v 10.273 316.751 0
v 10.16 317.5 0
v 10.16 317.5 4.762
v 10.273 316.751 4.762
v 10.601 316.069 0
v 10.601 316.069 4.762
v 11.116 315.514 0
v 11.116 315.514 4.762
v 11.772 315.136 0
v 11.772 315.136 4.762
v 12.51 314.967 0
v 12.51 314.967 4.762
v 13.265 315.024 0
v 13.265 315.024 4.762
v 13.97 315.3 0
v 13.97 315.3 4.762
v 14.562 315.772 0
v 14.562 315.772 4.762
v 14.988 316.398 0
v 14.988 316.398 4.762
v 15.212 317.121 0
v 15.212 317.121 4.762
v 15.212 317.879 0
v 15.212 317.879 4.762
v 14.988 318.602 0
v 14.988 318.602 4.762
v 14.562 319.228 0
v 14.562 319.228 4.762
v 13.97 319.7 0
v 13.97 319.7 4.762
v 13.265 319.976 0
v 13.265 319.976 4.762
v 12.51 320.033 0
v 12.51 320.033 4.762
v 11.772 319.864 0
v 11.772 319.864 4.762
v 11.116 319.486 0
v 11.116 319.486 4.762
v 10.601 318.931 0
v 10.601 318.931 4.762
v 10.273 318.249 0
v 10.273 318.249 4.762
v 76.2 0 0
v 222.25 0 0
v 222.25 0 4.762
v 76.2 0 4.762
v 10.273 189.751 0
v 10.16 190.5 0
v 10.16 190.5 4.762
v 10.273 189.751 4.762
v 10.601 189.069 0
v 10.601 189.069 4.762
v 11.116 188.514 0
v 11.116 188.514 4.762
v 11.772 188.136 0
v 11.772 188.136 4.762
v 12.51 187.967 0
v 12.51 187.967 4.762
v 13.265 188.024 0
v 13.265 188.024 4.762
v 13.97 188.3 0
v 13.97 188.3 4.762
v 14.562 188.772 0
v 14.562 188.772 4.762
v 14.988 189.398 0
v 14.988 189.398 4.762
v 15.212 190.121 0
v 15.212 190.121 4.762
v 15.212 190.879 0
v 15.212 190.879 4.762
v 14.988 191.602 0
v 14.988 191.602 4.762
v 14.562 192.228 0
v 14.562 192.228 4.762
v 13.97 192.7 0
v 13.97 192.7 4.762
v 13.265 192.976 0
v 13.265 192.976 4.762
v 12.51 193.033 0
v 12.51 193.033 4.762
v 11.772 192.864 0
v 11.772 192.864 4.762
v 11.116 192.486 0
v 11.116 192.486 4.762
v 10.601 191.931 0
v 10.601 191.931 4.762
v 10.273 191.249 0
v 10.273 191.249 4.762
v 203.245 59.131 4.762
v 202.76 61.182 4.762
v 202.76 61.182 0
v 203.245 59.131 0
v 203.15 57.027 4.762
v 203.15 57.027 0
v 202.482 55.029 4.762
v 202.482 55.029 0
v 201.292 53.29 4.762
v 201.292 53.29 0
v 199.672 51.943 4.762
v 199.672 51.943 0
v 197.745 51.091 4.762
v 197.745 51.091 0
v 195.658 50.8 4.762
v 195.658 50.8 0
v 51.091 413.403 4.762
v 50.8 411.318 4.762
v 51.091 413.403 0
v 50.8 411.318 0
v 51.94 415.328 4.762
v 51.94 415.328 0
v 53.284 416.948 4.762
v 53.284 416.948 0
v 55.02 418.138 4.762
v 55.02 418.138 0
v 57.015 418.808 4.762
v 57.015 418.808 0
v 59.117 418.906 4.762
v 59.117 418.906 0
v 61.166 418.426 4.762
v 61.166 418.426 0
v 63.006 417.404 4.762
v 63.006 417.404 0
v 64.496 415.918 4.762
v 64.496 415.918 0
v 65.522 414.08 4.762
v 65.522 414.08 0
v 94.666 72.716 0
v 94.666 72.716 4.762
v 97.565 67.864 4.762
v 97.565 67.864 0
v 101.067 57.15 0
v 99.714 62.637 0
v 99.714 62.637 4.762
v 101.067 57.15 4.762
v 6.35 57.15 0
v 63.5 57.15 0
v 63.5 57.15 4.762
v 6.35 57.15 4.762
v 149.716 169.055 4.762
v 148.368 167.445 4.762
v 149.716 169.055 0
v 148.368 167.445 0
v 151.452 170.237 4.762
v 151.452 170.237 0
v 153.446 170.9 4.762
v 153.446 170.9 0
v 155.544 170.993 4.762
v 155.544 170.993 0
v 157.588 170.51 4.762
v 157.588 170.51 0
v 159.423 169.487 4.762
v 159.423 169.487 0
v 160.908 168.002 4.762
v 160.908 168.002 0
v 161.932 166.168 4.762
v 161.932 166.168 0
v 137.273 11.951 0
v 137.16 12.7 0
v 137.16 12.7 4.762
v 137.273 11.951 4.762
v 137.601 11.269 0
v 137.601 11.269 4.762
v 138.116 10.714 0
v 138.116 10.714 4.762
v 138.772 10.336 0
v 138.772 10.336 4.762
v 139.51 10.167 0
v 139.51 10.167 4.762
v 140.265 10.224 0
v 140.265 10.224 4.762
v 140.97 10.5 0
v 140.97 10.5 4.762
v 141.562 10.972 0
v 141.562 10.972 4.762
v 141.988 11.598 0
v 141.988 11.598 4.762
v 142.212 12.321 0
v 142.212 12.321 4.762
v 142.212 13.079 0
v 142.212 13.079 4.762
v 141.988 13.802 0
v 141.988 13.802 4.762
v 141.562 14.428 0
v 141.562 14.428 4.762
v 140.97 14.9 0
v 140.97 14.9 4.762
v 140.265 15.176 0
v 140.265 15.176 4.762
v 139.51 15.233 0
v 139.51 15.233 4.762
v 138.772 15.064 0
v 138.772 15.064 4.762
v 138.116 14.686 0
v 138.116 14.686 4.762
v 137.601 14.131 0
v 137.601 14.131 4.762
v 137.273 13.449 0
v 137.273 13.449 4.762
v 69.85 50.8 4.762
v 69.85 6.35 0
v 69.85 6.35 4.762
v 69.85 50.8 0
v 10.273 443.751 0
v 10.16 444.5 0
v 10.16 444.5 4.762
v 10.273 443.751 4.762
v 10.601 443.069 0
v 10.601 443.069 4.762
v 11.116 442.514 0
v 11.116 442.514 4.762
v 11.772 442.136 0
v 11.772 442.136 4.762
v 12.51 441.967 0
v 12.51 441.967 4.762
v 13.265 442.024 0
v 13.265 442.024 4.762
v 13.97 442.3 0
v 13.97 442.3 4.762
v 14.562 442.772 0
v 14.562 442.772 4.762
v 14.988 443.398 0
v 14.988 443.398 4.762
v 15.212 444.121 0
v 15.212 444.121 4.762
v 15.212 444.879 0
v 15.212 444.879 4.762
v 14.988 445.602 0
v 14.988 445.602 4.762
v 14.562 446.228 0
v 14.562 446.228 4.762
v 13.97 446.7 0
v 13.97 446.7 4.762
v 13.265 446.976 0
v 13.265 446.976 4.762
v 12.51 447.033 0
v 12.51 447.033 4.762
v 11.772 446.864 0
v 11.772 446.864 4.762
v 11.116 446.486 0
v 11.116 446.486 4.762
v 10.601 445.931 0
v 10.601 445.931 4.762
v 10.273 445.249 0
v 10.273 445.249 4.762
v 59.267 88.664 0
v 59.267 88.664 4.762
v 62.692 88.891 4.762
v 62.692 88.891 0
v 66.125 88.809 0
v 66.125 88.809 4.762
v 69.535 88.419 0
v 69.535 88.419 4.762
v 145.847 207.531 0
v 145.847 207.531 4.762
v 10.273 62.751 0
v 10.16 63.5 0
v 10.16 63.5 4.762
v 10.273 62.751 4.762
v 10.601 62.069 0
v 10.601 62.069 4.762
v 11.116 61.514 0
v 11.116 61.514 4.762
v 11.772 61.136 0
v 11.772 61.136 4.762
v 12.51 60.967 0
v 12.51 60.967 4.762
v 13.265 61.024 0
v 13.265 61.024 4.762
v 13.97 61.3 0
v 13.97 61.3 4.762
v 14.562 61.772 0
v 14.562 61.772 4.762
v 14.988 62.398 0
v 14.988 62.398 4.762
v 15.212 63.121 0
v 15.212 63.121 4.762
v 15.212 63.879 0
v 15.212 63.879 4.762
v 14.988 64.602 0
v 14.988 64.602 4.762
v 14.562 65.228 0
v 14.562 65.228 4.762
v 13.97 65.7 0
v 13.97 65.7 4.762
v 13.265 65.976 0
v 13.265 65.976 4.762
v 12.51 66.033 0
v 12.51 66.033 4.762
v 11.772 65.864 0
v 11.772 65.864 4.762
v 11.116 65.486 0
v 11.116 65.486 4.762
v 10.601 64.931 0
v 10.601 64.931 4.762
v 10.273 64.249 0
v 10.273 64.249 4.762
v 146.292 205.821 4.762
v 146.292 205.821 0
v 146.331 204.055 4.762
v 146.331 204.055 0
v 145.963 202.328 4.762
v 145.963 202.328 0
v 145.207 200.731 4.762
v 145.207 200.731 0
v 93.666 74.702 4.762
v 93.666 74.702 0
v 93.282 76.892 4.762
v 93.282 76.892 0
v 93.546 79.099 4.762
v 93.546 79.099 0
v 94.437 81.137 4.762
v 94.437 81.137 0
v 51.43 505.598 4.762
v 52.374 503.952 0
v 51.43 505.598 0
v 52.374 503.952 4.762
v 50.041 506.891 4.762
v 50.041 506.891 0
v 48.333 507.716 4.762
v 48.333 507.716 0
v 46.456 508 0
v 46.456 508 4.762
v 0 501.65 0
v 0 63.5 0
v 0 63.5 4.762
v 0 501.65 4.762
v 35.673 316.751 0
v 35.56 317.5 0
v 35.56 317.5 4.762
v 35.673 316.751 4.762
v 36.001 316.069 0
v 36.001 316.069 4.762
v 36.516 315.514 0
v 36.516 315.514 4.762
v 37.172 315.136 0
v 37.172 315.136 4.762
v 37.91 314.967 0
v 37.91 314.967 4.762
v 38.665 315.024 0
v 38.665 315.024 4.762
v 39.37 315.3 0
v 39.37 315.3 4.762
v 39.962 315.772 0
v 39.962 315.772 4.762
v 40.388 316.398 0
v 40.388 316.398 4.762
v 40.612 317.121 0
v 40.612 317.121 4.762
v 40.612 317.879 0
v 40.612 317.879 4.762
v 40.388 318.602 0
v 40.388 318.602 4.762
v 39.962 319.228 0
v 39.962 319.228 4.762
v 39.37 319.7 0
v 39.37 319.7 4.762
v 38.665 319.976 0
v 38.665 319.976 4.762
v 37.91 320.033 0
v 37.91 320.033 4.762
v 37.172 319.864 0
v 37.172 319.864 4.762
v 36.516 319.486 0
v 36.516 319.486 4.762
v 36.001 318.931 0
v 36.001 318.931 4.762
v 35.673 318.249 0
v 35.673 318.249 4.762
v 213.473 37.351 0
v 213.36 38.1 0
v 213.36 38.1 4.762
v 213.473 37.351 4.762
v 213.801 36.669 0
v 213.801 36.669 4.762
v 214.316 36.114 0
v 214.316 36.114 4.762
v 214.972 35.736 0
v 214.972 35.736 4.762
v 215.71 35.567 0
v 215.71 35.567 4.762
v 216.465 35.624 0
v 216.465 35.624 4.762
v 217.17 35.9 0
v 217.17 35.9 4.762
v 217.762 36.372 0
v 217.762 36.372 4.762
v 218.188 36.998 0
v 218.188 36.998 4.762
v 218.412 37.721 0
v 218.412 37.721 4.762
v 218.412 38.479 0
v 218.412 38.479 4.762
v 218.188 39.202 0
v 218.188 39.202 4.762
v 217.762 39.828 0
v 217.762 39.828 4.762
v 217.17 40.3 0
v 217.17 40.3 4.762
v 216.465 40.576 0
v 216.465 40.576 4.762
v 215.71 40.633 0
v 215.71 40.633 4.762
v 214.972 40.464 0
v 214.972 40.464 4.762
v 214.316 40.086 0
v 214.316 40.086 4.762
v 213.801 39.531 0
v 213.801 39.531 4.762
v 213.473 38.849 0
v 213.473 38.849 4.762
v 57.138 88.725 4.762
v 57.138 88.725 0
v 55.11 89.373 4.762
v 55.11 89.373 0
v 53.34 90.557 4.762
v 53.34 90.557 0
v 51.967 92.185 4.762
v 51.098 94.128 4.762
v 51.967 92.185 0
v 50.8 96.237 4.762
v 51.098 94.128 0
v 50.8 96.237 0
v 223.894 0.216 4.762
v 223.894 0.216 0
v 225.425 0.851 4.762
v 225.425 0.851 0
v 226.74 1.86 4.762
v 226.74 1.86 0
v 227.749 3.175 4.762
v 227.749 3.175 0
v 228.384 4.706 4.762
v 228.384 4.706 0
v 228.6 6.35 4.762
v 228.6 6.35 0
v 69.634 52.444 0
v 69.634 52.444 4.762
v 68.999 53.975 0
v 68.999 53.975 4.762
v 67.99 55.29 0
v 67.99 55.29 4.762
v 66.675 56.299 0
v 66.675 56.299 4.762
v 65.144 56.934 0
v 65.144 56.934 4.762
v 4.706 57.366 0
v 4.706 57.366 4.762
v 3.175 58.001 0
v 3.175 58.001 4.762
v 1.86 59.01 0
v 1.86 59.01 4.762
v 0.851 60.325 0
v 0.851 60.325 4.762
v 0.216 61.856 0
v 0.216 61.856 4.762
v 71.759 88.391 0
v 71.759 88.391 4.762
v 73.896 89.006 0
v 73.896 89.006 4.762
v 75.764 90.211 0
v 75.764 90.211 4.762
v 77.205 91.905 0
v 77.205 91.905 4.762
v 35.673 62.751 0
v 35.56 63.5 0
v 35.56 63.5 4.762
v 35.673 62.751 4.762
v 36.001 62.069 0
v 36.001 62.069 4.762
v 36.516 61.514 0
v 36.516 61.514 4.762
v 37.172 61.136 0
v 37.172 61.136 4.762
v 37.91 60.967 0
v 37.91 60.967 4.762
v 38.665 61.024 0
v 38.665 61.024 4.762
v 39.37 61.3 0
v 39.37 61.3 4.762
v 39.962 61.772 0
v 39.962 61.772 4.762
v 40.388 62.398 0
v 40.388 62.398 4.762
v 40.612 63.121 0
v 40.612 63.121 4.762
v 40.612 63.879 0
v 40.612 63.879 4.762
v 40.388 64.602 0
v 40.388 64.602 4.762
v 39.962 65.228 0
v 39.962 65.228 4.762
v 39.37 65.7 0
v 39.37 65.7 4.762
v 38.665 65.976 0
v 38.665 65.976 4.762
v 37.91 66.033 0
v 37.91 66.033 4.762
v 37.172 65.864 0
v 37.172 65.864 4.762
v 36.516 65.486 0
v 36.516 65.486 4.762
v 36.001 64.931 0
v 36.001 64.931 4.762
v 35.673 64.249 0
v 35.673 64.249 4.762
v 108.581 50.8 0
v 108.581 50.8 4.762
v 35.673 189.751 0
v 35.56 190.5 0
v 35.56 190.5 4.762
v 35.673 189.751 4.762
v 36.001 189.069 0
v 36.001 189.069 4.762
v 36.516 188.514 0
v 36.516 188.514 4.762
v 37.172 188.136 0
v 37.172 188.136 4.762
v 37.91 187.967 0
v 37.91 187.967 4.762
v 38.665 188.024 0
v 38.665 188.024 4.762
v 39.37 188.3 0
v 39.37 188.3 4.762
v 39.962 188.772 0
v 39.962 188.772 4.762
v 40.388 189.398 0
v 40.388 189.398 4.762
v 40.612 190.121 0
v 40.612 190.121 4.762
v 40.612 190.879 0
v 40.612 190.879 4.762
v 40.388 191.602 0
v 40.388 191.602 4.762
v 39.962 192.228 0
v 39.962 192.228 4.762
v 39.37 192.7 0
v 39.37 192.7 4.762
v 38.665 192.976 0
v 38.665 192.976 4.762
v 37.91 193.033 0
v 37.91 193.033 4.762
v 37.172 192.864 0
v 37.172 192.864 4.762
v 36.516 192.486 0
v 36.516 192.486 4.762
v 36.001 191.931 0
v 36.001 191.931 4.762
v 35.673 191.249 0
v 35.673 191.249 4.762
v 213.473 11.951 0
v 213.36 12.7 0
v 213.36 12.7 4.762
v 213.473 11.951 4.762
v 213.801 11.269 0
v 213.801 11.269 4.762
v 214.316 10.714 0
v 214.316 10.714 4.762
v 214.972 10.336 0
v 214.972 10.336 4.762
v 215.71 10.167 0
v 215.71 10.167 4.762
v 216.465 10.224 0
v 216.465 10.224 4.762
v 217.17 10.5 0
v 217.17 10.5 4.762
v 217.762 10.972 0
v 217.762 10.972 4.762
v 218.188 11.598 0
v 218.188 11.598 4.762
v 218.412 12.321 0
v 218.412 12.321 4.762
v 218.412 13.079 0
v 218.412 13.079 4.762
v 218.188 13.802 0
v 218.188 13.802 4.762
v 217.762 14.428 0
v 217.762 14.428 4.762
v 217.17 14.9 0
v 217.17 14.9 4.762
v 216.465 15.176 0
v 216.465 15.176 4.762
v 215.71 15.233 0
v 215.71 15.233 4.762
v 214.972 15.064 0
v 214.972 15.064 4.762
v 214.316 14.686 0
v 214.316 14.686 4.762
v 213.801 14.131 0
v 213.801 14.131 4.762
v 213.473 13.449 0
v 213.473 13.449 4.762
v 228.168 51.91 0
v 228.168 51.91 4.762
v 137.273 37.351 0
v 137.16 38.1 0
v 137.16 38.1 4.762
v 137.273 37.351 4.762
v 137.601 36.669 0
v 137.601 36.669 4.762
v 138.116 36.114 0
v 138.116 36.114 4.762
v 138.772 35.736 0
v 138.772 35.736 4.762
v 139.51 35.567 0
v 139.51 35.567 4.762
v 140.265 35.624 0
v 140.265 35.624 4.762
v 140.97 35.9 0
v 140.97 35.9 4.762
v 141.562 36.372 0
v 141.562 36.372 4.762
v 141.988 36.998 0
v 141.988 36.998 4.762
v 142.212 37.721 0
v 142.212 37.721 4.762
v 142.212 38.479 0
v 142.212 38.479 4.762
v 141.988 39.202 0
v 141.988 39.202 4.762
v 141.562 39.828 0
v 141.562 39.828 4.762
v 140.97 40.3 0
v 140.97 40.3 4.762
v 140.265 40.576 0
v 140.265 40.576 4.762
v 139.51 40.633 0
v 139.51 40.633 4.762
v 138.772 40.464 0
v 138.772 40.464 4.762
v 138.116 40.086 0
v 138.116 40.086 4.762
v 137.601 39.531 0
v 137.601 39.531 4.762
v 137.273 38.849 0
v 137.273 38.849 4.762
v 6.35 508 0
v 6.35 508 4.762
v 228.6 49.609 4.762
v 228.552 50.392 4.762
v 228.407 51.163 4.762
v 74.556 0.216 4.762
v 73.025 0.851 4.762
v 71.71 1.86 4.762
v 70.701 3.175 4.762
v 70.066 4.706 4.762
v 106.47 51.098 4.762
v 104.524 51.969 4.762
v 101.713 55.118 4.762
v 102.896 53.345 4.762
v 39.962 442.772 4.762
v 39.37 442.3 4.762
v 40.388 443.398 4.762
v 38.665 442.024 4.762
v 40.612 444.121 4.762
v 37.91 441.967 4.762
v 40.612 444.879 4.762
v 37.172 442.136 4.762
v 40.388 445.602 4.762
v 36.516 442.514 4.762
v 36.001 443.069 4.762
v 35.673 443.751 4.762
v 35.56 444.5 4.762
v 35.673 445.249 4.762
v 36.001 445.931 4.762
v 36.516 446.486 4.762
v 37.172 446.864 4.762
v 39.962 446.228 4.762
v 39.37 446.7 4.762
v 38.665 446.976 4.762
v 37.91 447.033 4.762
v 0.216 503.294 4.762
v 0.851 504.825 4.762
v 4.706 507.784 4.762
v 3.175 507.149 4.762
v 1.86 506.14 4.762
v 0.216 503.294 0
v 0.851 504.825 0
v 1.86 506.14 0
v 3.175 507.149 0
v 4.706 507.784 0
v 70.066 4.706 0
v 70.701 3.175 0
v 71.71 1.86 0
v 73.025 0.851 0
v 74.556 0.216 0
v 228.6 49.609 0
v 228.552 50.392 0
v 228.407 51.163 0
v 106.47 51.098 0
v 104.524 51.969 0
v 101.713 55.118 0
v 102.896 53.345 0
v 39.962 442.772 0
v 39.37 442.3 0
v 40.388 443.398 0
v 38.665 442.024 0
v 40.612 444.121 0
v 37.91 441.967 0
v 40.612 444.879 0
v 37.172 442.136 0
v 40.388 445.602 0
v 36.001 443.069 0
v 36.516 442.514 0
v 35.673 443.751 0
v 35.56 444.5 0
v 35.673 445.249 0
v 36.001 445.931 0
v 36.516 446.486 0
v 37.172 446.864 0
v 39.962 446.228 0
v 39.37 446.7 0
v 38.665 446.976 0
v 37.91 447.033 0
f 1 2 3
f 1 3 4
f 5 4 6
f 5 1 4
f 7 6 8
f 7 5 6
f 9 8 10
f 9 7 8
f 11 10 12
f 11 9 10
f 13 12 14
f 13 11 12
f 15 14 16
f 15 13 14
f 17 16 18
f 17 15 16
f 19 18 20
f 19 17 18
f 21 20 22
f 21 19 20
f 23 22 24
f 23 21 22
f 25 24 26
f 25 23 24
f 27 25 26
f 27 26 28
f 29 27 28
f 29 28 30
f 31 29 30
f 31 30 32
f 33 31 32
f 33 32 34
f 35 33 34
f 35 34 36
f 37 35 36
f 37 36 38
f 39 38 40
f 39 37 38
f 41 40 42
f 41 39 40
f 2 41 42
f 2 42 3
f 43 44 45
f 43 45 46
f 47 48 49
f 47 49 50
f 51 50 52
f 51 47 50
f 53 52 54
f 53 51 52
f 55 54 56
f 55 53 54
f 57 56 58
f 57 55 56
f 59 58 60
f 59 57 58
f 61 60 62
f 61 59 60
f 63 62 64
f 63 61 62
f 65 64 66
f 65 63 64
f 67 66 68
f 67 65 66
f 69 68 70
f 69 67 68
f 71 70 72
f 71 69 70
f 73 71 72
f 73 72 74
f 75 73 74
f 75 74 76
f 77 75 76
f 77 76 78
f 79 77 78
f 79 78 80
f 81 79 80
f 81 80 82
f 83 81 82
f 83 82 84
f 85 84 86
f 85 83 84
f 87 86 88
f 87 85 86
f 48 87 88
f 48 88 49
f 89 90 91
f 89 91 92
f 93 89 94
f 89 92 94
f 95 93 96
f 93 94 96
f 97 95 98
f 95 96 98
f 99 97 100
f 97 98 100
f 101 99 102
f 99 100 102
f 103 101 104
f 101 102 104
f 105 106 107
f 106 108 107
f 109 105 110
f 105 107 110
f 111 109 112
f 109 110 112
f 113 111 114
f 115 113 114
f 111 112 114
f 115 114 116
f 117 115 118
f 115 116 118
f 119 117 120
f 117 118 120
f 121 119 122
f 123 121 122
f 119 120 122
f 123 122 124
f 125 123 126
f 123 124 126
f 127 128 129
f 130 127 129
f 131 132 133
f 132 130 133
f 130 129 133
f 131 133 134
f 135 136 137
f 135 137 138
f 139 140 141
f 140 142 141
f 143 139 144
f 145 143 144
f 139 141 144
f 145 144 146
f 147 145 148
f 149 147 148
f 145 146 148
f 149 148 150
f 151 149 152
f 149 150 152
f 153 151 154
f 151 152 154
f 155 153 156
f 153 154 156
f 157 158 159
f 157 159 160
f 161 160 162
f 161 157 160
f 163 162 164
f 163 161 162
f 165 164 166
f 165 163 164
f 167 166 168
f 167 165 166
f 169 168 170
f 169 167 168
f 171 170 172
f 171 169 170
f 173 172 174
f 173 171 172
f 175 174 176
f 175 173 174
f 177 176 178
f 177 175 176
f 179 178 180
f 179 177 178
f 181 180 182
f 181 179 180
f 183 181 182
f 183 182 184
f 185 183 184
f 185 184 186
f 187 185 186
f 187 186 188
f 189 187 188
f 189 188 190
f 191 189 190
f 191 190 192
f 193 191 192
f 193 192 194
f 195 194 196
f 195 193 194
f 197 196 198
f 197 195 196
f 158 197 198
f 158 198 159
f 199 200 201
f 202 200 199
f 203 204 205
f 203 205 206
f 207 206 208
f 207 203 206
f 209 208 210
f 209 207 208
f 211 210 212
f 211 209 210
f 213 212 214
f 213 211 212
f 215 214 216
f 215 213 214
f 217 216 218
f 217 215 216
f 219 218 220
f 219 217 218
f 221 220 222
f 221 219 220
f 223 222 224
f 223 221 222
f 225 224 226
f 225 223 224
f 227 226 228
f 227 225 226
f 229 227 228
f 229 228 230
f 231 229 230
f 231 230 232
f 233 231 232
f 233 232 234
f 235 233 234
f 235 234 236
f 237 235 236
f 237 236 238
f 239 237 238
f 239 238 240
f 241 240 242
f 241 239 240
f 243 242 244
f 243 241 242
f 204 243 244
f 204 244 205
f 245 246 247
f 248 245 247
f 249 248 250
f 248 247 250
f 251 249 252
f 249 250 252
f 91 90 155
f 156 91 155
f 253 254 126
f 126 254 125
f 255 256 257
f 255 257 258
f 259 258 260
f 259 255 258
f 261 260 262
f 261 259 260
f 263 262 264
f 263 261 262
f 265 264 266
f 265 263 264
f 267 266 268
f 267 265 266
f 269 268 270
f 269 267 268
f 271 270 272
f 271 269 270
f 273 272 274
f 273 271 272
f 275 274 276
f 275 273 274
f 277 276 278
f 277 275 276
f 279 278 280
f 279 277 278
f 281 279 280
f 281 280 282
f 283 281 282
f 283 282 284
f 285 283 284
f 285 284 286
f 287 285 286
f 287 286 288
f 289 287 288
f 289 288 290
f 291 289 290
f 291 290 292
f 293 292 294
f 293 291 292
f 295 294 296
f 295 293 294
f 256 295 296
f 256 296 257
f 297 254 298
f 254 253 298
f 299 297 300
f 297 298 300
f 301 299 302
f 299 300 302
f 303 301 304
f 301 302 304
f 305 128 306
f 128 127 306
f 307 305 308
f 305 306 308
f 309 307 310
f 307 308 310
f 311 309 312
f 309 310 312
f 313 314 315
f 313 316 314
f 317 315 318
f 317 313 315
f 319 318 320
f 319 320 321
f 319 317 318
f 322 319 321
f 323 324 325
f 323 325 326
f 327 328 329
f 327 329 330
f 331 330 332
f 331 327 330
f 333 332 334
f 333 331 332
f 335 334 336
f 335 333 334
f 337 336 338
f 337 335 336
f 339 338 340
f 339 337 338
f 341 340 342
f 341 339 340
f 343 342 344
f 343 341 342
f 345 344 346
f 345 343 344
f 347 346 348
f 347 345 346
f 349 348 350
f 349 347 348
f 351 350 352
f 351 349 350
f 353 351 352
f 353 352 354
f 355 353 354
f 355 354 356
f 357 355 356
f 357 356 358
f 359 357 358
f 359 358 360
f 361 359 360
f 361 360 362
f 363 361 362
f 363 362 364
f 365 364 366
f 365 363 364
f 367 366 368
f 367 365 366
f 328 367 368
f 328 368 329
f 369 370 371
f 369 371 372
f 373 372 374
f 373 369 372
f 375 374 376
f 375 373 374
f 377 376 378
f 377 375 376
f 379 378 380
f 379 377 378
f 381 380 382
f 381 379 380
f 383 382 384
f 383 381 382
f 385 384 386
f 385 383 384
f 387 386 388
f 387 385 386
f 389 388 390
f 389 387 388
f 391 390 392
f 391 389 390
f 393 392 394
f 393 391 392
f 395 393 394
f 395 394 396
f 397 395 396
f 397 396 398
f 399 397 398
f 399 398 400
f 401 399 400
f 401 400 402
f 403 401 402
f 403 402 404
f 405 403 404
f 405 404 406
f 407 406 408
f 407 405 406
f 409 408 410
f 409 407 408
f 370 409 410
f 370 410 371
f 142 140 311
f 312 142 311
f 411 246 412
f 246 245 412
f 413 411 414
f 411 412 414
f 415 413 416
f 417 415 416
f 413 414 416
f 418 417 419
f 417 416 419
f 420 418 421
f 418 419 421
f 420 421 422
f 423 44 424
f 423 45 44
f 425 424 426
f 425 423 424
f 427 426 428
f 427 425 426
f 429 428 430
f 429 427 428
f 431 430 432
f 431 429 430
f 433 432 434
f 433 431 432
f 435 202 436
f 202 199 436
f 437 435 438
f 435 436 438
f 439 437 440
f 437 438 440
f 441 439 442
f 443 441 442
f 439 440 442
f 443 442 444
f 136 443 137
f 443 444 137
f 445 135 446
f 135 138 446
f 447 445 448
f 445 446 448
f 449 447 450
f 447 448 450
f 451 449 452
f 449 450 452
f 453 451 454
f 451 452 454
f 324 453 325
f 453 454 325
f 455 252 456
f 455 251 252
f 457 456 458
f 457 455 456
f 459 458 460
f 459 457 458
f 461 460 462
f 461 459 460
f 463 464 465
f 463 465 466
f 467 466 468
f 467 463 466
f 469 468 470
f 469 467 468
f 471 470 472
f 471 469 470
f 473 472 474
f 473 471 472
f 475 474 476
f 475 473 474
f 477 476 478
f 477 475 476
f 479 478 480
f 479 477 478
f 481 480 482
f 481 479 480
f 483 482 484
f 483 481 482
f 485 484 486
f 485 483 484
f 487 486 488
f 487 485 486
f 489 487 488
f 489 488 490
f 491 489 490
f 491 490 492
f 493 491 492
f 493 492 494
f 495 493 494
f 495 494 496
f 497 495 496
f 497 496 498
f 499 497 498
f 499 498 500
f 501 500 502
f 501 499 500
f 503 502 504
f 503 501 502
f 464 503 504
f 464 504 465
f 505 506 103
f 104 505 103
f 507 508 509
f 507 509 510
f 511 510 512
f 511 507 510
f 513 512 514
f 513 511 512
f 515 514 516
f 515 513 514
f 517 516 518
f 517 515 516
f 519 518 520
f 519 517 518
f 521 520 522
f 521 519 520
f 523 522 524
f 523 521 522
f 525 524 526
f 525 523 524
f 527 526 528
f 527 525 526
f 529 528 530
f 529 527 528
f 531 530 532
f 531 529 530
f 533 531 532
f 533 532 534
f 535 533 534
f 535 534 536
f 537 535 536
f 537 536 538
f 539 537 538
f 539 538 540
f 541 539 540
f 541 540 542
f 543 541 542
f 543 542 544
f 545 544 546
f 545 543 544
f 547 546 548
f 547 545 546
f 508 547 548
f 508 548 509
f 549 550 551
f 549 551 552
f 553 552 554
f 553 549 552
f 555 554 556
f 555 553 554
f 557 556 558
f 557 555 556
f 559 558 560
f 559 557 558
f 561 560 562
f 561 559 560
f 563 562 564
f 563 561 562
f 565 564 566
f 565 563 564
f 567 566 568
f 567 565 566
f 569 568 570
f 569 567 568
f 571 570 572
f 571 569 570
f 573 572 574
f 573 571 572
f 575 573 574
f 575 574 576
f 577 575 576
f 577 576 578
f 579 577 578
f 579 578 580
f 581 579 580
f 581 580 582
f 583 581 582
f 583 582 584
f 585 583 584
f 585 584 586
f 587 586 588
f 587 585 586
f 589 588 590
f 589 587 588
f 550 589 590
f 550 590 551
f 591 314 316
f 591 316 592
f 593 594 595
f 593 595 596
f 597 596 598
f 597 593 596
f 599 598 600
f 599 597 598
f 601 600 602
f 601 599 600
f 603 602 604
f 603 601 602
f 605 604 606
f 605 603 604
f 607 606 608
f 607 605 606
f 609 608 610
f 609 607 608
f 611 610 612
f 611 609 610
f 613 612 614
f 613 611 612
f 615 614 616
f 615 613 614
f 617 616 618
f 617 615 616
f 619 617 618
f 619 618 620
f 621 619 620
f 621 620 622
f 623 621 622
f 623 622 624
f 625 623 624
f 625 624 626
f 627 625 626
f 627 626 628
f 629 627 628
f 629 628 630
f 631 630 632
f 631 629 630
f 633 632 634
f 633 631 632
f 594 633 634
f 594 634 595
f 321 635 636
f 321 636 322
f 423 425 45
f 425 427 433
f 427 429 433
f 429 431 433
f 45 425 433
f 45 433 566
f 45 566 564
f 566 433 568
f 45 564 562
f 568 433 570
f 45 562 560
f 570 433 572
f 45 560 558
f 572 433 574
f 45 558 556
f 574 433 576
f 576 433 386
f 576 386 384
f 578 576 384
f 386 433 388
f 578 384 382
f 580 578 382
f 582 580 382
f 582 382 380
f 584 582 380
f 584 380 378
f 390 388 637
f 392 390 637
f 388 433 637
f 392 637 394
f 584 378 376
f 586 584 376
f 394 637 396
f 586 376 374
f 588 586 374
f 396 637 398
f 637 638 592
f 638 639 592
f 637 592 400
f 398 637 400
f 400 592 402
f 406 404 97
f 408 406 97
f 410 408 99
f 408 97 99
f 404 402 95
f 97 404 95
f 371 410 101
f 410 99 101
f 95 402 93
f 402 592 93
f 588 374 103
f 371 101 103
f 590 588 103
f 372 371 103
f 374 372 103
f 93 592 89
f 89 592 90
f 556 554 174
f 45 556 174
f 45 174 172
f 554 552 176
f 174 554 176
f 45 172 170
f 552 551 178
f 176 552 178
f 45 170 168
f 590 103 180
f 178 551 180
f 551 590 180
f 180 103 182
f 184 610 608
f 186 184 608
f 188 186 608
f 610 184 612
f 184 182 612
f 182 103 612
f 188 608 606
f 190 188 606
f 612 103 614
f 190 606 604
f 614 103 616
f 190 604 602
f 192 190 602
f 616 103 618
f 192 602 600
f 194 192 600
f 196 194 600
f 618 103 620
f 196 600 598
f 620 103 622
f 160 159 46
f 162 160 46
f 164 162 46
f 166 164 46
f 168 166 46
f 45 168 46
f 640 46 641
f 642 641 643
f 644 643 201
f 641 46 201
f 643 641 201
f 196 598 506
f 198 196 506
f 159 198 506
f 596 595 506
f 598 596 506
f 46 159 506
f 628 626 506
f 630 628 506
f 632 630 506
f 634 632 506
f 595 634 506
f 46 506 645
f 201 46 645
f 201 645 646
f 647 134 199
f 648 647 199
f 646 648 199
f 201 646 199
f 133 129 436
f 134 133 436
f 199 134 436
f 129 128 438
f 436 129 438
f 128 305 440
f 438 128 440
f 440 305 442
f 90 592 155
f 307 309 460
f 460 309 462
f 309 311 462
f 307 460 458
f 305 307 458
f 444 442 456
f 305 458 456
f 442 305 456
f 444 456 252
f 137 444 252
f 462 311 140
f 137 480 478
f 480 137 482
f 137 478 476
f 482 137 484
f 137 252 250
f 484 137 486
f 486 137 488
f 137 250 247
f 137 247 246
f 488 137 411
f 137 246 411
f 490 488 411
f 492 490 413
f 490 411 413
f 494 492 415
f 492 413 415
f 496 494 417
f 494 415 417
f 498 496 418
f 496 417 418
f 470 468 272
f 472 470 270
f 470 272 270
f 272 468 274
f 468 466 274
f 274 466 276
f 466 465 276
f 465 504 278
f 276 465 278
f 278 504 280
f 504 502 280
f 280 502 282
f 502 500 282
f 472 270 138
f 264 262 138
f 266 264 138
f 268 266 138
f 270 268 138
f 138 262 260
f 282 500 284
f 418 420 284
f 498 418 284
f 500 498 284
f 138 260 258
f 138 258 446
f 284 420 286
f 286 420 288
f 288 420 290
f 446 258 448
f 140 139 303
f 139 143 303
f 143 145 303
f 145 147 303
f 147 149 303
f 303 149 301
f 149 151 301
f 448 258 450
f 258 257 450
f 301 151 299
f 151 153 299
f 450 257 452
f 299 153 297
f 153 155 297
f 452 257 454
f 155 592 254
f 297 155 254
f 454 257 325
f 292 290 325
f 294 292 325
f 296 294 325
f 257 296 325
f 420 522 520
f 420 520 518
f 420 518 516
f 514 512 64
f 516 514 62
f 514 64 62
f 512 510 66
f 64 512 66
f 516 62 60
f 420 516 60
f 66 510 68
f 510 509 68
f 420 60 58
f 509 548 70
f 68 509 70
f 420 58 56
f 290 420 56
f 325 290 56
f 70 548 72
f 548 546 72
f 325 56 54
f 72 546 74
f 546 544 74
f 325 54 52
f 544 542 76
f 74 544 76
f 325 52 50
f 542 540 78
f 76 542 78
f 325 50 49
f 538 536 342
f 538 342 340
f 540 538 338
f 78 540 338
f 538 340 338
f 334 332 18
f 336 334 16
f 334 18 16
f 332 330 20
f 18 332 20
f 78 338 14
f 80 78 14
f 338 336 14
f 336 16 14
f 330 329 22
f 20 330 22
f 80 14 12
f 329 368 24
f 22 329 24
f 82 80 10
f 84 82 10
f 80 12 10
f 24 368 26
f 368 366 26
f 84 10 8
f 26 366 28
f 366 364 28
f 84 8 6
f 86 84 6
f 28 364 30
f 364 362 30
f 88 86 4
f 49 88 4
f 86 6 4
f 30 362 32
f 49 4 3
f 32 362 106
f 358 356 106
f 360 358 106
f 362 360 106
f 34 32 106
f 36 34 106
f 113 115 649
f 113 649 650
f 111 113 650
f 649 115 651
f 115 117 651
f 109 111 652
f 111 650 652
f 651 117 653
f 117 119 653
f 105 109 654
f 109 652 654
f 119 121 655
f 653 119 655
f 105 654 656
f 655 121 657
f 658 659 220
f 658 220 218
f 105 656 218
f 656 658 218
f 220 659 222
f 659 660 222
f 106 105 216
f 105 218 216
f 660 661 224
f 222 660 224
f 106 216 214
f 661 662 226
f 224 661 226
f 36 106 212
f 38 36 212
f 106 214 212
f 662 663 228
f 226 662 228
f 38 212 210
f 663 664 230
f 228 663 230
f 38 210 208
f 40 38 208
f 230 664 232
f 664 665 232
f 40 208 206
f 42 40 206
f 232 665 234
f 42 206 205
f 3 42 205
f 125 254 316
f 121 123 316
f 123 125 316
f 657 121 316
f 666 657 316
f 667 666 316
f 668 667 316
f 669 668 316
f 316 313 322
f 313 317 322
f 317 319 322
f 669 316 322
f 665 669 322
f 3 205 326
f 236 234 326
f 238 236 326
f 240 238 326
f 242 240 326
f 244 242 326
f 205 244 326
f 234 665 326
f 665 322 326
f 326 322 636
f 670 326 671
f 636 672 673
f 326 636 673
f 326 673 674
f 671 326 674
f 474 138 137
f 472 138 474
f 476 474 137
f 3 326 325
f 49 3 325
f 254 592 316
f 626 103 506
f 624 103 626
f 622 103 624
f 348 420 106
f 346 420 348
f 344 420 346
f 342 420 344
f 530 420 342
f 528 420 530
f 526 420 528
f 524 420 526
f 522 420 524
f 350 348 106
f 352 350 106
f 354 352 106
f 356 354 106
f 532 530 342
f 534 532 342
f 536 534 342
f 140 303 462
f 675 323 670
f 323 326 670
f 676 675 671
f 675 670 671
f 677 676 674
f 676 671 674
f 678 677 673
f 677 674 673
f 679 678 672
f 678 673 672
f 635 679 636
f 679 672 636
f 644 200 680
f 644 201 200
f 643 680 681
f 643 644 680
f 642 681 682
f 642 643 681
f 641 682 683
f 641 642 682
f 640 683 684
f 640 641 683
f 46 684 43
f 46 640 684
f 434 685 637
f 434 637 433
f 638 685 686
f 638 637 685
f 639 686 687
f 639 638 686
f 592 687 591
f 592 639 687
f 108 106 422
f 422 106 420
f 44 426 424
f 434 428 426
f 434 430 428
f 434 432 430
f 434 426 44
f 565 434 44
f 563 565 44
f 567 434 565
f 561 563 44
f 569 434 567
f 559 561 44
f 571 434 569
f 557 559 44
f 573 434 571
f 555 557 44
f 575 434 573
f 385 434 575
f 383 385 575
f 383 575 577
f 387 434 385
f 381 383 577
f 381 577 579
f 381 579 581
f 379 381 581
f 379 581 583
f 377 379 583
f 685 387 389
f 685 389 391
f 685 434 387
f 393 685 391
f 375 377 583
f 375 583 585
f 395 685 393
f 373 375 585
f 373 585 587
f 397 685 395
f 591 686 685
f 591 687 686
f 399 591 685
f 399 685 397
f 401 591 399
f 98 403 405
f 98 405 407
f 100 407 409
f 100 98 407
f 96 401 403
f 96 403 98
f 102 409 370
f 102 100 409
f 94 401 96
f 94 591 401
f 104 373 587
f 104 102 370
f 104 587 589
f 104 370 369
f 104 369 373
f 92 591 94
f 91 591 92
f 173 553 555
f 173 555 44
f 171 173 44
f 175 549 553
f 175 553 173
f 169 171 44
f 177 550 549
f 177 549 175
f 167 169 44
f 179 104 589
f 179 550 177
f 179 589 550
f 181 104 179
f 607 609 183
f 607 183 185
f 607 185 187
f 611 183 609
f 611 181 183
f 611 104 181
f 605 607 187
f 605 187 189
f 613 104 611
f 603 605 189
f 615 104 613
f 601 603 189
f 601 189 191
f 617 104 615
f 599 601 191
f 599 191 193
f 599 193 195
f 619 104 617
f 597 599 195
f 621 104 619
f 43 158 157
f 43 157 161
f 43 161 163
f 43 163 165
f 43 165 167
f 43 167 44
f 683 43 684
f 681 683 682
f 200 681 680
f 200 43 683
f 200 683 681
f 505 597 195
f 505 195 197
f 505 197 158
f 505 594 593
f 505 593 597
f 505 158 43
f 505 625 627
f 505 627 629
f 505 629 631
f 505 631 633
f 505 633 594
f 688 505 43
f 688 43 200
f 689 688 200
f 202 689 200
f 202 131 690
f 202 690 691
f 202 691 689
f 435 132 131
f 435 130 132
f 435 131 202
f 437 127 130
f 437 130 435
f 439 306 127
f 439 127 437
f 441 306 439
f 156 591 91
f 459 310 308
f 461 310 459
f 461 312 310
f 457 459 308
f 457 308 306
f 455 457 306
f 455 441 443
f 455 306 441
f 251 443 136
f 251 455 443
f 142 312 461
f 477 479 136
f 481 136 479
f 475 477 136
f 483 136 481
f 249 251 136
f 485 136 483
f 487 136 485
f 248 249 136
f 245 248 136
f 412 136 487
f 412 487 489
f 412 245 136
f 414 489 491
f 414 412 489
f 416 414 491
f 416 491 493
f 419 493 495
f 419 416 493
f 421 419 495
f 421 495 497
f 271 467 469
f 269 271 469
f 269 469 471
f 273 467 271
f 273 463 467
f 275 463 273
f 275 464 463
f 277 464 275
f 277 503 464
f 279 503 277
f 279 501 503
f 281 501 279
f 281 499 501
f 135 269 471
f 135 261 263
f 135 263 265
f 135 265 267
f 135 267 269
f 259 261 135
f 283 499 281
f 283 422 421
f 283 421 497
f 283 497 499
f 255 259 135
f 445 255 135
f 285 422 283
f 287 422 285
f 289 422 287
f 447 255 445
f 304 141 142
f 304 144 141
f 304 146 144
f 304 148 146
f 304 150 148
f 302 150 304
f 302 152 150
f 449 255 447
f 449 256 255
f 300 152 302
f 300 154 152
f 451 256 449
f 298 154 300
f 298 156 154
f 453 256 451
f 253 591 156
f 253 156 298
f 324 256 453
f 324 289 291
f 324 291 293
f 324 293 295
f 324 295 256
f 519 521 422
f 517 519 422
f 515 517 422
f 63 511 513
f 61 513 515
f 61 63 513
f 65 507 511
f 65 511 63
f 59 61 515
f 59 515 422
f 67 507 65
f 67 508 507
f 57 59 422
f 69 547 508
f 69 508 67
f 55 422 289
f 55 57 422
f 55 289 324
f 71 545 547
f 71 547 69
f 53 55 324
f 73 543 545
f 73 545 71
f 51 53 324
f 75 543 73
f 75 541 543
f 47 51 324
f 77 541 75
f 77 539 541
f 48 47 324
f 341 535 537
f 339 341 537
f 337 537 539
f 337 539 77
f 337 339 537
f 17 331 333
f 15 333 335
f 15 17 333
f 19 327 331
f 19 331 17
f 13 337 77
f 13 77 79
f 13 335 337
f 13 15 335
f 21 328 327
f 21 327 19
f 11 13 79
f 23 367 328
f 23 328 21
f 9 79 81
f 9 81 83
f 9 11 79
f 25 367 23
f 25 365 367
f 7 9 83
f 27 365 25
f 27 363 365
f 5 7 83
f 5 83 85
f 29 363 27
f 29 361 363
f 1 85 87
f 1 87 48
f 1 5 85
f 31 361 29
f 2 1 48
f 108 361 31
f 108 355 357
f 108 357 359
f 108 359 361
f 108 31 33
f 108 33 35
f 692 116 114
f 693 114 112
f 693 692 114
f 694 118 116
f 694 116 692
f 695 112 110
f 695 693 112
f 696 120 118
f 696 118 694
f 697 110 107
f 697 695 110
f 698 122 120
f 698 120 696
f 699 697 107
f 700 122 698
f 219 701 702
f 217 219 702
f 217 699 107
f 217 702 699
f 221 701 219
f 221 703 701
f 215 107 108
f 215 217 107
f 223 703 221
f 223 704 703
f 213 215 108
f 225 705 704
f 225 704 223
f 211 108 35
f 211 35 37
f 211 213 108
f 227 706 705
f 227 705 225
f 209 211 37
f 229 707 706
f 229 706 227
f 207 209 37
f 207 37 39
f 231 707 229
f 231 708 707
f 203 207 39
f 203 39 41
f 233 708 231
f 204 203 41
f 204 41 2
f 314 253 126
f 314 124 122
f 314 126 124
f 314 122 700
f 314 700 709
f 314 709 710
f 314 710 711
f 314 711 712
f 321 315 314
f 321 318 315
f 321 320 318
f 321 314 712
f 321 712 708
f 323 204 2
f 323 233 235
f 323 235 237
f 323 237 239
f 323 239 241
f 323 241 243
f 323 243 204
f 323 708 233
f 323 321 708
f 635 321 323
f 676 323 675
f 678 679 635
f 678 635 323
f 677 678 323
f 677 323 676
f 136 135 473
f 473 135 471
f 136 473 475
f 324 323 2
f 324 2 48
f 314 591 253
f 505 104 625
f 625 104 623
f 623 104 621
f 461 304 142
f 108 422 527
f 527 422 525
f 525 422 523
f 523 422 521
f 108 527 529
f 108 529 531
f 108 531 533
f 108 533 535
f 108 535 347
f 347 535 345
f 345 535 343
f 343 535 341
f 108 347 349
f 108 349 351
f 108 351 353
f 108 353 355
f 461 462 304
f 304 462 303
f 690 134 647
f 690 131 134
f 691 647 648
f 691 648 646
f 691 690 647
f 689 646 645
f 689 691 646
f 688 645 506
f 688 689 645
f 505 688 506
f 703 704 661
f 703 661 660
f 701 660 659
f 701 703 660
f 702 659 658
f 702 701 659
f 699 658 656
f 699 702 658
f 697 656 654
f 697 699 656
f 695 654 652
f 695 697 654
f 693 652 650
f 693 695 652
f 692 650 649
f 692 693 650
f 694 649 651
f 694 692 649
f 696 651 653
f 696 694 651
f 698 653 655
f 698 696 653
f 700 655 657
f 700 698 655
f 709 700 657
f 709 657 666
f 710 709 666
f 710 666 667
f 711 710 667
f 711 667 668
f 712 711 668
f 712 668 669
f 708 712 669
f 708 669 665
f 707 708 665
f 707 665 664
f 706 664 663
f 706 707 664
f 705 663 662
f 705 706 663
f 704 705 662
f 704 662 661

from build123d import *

# Parameters (mm, degrees)
SKETCH1_R           = 2.54
BOSS_EXTRUDE1_DEPTH = 4.7625
FILLET1_R           = 6.35
CUT_EXTRUDE1_DEPTH  = 558.08584743
FILLET2_R           = 7.62


with BuildPart() as part:
    # Sketch1 → Boss-Extrude1 (new body)
    with BuildSketch(Plane.XY):
        Polygon((69.85, 0), (69.85, 57.15), (0, 57.15), (0, 508), (50.8, 508), (228.6, 50.8), (228.6, 0), align=None)
        with Locations(Location((12.7, 63.5, 0), (0, 0, 180))):
            Circle(SKETCH1_R, mode=Mode.SUBTRACT)
        with Locations(Location((38.1, 63.5, 0), (0, 0, 180))):
            Circle(SKETCH1_R, mode=Mode.SUBTRACT)
        with Locations(Location((38.1, 190.5, 0), (0, 0, 180))):
            Circle(SKETCH1_R, mode=Mode.SUBTRACT)
        with Locations(Location((12.7, 190.5, 0), (0, 0, 180))):
            Circle(SKETCH1_R, mode=Mode.SUBTRACT)
        with Locations(Location((38.1, 317.5, 0), (0, 0, 180))):
            Circle(SKETCH1_R, mode=Mode.SUBTRACT)
        with Locations(Location((12.7, 317.5, 0), (0, 0, 180))):
            Circle(SKETCH1_R, mode=Mode.SUBTRACT)
        with Locations(Location((139.7, 12.7, 0), (0, 0, 180))):
            Circle(SKETCH1_R, mode=Mode.SUBTRACT)
        with Locations(Location((139.7, 38.1, 0), (0, 0, 180))):
            Circle(SKETCH1_R, mode=Mode.SUBTRACT)
        with Locations(Location((215.9, 12.7, 0), (0, 0, 180))):
            Circle(SKETCH1_R, mode=Mode.SUBTRACT)
        with Locations(Location((215.9, 38.1, 0), (0, 0, 180))):
            Circle(SKETCH1_R, mode=Mode.SUBTRACT)
        with Locations(Location((38.1, 444.5, 0), (0, 0, 180))):
            Circle(SKETCH1_R, mode=Mode.SUBTRACT)
        with Locations(Location((12.7, 444.5, 0), (0, 0, 180))):
            Circle(SKETCH1_R, mode=Mode.SUBTRACT)
    extrude(amount=BOSS_EXTRUDE1_DEPTH)

    # Fillet1
    fillet1_edges = [part.edges().sort_by_distance(p)[0] for p in [
        (0, 508, 2.38125),
        (50.8, 508, 2.38125),
        (228.6, 50.8, 2.38125),
        (228.6, 0, 2.38125),
        (69.85, 0, 2.38125),
        (69.85, 57.15, 2.38125),
        (0, 57.15, 2.38125),
    ]]
    fillet(fillet1_edges, radius=FILLET1_R)

    # Sketch2 → Cut-Extrude1 (cut, through all)
    with BuildSketch(Plane.XY.offset(4.7625)):
        with BuildLine():
            ThreePointArc((91.574991646, 76.5566466), (99.005402277, 64.619421447), (101.6, 50.8))
            Line((101.6, 50.8), (206.797534175, 50.8))
            Line((206.797534175, 50.8), (156.422847293, 180.334909125))
            Line((156.422847293, 180.334909125), (91.574991646, 76.5566466))
        make_face()
        with BuildLine():
            ThreePointArc((50.8, 86.721024484), (62.523521168, 88.887484678), (74.342654332, 87.324606049))
            Line((74.342654332, 87.324606049), (147.2311787, 203.970628365))
            Line((147.2311787, 203.970628365), (50.8, 451.93651645))
            Line((50.8, 451.93651645), (50.8, 86.721024484))
        make_face()
    extrude(amount=-CUT_EXTRUDE1_DEPTH, mode=Mode.SUBTRACT)

    # Fillet2
    fillet2_edges = [part.edges().sort_by_distance(p)[0] for p in [
        (50.8, 86.721024484, 2.38125),
        (50.8, 451.93651645, 2.38125),
        (147.2311787, 203.970628365, 2.38125),
        (74.342654332, 87.324606049, 2.38125),
        (91.574991646, 76.5566466, 2.38125),
        (156.422847293, 180.334909125, 2.38125),
        (206.797534175, 50.8, 2.38125),
        (101.6, 50.8, 2.38125),
    ]]
    fillet(fillet2_edges, radius=FILLET2_R)


solid = part.part
